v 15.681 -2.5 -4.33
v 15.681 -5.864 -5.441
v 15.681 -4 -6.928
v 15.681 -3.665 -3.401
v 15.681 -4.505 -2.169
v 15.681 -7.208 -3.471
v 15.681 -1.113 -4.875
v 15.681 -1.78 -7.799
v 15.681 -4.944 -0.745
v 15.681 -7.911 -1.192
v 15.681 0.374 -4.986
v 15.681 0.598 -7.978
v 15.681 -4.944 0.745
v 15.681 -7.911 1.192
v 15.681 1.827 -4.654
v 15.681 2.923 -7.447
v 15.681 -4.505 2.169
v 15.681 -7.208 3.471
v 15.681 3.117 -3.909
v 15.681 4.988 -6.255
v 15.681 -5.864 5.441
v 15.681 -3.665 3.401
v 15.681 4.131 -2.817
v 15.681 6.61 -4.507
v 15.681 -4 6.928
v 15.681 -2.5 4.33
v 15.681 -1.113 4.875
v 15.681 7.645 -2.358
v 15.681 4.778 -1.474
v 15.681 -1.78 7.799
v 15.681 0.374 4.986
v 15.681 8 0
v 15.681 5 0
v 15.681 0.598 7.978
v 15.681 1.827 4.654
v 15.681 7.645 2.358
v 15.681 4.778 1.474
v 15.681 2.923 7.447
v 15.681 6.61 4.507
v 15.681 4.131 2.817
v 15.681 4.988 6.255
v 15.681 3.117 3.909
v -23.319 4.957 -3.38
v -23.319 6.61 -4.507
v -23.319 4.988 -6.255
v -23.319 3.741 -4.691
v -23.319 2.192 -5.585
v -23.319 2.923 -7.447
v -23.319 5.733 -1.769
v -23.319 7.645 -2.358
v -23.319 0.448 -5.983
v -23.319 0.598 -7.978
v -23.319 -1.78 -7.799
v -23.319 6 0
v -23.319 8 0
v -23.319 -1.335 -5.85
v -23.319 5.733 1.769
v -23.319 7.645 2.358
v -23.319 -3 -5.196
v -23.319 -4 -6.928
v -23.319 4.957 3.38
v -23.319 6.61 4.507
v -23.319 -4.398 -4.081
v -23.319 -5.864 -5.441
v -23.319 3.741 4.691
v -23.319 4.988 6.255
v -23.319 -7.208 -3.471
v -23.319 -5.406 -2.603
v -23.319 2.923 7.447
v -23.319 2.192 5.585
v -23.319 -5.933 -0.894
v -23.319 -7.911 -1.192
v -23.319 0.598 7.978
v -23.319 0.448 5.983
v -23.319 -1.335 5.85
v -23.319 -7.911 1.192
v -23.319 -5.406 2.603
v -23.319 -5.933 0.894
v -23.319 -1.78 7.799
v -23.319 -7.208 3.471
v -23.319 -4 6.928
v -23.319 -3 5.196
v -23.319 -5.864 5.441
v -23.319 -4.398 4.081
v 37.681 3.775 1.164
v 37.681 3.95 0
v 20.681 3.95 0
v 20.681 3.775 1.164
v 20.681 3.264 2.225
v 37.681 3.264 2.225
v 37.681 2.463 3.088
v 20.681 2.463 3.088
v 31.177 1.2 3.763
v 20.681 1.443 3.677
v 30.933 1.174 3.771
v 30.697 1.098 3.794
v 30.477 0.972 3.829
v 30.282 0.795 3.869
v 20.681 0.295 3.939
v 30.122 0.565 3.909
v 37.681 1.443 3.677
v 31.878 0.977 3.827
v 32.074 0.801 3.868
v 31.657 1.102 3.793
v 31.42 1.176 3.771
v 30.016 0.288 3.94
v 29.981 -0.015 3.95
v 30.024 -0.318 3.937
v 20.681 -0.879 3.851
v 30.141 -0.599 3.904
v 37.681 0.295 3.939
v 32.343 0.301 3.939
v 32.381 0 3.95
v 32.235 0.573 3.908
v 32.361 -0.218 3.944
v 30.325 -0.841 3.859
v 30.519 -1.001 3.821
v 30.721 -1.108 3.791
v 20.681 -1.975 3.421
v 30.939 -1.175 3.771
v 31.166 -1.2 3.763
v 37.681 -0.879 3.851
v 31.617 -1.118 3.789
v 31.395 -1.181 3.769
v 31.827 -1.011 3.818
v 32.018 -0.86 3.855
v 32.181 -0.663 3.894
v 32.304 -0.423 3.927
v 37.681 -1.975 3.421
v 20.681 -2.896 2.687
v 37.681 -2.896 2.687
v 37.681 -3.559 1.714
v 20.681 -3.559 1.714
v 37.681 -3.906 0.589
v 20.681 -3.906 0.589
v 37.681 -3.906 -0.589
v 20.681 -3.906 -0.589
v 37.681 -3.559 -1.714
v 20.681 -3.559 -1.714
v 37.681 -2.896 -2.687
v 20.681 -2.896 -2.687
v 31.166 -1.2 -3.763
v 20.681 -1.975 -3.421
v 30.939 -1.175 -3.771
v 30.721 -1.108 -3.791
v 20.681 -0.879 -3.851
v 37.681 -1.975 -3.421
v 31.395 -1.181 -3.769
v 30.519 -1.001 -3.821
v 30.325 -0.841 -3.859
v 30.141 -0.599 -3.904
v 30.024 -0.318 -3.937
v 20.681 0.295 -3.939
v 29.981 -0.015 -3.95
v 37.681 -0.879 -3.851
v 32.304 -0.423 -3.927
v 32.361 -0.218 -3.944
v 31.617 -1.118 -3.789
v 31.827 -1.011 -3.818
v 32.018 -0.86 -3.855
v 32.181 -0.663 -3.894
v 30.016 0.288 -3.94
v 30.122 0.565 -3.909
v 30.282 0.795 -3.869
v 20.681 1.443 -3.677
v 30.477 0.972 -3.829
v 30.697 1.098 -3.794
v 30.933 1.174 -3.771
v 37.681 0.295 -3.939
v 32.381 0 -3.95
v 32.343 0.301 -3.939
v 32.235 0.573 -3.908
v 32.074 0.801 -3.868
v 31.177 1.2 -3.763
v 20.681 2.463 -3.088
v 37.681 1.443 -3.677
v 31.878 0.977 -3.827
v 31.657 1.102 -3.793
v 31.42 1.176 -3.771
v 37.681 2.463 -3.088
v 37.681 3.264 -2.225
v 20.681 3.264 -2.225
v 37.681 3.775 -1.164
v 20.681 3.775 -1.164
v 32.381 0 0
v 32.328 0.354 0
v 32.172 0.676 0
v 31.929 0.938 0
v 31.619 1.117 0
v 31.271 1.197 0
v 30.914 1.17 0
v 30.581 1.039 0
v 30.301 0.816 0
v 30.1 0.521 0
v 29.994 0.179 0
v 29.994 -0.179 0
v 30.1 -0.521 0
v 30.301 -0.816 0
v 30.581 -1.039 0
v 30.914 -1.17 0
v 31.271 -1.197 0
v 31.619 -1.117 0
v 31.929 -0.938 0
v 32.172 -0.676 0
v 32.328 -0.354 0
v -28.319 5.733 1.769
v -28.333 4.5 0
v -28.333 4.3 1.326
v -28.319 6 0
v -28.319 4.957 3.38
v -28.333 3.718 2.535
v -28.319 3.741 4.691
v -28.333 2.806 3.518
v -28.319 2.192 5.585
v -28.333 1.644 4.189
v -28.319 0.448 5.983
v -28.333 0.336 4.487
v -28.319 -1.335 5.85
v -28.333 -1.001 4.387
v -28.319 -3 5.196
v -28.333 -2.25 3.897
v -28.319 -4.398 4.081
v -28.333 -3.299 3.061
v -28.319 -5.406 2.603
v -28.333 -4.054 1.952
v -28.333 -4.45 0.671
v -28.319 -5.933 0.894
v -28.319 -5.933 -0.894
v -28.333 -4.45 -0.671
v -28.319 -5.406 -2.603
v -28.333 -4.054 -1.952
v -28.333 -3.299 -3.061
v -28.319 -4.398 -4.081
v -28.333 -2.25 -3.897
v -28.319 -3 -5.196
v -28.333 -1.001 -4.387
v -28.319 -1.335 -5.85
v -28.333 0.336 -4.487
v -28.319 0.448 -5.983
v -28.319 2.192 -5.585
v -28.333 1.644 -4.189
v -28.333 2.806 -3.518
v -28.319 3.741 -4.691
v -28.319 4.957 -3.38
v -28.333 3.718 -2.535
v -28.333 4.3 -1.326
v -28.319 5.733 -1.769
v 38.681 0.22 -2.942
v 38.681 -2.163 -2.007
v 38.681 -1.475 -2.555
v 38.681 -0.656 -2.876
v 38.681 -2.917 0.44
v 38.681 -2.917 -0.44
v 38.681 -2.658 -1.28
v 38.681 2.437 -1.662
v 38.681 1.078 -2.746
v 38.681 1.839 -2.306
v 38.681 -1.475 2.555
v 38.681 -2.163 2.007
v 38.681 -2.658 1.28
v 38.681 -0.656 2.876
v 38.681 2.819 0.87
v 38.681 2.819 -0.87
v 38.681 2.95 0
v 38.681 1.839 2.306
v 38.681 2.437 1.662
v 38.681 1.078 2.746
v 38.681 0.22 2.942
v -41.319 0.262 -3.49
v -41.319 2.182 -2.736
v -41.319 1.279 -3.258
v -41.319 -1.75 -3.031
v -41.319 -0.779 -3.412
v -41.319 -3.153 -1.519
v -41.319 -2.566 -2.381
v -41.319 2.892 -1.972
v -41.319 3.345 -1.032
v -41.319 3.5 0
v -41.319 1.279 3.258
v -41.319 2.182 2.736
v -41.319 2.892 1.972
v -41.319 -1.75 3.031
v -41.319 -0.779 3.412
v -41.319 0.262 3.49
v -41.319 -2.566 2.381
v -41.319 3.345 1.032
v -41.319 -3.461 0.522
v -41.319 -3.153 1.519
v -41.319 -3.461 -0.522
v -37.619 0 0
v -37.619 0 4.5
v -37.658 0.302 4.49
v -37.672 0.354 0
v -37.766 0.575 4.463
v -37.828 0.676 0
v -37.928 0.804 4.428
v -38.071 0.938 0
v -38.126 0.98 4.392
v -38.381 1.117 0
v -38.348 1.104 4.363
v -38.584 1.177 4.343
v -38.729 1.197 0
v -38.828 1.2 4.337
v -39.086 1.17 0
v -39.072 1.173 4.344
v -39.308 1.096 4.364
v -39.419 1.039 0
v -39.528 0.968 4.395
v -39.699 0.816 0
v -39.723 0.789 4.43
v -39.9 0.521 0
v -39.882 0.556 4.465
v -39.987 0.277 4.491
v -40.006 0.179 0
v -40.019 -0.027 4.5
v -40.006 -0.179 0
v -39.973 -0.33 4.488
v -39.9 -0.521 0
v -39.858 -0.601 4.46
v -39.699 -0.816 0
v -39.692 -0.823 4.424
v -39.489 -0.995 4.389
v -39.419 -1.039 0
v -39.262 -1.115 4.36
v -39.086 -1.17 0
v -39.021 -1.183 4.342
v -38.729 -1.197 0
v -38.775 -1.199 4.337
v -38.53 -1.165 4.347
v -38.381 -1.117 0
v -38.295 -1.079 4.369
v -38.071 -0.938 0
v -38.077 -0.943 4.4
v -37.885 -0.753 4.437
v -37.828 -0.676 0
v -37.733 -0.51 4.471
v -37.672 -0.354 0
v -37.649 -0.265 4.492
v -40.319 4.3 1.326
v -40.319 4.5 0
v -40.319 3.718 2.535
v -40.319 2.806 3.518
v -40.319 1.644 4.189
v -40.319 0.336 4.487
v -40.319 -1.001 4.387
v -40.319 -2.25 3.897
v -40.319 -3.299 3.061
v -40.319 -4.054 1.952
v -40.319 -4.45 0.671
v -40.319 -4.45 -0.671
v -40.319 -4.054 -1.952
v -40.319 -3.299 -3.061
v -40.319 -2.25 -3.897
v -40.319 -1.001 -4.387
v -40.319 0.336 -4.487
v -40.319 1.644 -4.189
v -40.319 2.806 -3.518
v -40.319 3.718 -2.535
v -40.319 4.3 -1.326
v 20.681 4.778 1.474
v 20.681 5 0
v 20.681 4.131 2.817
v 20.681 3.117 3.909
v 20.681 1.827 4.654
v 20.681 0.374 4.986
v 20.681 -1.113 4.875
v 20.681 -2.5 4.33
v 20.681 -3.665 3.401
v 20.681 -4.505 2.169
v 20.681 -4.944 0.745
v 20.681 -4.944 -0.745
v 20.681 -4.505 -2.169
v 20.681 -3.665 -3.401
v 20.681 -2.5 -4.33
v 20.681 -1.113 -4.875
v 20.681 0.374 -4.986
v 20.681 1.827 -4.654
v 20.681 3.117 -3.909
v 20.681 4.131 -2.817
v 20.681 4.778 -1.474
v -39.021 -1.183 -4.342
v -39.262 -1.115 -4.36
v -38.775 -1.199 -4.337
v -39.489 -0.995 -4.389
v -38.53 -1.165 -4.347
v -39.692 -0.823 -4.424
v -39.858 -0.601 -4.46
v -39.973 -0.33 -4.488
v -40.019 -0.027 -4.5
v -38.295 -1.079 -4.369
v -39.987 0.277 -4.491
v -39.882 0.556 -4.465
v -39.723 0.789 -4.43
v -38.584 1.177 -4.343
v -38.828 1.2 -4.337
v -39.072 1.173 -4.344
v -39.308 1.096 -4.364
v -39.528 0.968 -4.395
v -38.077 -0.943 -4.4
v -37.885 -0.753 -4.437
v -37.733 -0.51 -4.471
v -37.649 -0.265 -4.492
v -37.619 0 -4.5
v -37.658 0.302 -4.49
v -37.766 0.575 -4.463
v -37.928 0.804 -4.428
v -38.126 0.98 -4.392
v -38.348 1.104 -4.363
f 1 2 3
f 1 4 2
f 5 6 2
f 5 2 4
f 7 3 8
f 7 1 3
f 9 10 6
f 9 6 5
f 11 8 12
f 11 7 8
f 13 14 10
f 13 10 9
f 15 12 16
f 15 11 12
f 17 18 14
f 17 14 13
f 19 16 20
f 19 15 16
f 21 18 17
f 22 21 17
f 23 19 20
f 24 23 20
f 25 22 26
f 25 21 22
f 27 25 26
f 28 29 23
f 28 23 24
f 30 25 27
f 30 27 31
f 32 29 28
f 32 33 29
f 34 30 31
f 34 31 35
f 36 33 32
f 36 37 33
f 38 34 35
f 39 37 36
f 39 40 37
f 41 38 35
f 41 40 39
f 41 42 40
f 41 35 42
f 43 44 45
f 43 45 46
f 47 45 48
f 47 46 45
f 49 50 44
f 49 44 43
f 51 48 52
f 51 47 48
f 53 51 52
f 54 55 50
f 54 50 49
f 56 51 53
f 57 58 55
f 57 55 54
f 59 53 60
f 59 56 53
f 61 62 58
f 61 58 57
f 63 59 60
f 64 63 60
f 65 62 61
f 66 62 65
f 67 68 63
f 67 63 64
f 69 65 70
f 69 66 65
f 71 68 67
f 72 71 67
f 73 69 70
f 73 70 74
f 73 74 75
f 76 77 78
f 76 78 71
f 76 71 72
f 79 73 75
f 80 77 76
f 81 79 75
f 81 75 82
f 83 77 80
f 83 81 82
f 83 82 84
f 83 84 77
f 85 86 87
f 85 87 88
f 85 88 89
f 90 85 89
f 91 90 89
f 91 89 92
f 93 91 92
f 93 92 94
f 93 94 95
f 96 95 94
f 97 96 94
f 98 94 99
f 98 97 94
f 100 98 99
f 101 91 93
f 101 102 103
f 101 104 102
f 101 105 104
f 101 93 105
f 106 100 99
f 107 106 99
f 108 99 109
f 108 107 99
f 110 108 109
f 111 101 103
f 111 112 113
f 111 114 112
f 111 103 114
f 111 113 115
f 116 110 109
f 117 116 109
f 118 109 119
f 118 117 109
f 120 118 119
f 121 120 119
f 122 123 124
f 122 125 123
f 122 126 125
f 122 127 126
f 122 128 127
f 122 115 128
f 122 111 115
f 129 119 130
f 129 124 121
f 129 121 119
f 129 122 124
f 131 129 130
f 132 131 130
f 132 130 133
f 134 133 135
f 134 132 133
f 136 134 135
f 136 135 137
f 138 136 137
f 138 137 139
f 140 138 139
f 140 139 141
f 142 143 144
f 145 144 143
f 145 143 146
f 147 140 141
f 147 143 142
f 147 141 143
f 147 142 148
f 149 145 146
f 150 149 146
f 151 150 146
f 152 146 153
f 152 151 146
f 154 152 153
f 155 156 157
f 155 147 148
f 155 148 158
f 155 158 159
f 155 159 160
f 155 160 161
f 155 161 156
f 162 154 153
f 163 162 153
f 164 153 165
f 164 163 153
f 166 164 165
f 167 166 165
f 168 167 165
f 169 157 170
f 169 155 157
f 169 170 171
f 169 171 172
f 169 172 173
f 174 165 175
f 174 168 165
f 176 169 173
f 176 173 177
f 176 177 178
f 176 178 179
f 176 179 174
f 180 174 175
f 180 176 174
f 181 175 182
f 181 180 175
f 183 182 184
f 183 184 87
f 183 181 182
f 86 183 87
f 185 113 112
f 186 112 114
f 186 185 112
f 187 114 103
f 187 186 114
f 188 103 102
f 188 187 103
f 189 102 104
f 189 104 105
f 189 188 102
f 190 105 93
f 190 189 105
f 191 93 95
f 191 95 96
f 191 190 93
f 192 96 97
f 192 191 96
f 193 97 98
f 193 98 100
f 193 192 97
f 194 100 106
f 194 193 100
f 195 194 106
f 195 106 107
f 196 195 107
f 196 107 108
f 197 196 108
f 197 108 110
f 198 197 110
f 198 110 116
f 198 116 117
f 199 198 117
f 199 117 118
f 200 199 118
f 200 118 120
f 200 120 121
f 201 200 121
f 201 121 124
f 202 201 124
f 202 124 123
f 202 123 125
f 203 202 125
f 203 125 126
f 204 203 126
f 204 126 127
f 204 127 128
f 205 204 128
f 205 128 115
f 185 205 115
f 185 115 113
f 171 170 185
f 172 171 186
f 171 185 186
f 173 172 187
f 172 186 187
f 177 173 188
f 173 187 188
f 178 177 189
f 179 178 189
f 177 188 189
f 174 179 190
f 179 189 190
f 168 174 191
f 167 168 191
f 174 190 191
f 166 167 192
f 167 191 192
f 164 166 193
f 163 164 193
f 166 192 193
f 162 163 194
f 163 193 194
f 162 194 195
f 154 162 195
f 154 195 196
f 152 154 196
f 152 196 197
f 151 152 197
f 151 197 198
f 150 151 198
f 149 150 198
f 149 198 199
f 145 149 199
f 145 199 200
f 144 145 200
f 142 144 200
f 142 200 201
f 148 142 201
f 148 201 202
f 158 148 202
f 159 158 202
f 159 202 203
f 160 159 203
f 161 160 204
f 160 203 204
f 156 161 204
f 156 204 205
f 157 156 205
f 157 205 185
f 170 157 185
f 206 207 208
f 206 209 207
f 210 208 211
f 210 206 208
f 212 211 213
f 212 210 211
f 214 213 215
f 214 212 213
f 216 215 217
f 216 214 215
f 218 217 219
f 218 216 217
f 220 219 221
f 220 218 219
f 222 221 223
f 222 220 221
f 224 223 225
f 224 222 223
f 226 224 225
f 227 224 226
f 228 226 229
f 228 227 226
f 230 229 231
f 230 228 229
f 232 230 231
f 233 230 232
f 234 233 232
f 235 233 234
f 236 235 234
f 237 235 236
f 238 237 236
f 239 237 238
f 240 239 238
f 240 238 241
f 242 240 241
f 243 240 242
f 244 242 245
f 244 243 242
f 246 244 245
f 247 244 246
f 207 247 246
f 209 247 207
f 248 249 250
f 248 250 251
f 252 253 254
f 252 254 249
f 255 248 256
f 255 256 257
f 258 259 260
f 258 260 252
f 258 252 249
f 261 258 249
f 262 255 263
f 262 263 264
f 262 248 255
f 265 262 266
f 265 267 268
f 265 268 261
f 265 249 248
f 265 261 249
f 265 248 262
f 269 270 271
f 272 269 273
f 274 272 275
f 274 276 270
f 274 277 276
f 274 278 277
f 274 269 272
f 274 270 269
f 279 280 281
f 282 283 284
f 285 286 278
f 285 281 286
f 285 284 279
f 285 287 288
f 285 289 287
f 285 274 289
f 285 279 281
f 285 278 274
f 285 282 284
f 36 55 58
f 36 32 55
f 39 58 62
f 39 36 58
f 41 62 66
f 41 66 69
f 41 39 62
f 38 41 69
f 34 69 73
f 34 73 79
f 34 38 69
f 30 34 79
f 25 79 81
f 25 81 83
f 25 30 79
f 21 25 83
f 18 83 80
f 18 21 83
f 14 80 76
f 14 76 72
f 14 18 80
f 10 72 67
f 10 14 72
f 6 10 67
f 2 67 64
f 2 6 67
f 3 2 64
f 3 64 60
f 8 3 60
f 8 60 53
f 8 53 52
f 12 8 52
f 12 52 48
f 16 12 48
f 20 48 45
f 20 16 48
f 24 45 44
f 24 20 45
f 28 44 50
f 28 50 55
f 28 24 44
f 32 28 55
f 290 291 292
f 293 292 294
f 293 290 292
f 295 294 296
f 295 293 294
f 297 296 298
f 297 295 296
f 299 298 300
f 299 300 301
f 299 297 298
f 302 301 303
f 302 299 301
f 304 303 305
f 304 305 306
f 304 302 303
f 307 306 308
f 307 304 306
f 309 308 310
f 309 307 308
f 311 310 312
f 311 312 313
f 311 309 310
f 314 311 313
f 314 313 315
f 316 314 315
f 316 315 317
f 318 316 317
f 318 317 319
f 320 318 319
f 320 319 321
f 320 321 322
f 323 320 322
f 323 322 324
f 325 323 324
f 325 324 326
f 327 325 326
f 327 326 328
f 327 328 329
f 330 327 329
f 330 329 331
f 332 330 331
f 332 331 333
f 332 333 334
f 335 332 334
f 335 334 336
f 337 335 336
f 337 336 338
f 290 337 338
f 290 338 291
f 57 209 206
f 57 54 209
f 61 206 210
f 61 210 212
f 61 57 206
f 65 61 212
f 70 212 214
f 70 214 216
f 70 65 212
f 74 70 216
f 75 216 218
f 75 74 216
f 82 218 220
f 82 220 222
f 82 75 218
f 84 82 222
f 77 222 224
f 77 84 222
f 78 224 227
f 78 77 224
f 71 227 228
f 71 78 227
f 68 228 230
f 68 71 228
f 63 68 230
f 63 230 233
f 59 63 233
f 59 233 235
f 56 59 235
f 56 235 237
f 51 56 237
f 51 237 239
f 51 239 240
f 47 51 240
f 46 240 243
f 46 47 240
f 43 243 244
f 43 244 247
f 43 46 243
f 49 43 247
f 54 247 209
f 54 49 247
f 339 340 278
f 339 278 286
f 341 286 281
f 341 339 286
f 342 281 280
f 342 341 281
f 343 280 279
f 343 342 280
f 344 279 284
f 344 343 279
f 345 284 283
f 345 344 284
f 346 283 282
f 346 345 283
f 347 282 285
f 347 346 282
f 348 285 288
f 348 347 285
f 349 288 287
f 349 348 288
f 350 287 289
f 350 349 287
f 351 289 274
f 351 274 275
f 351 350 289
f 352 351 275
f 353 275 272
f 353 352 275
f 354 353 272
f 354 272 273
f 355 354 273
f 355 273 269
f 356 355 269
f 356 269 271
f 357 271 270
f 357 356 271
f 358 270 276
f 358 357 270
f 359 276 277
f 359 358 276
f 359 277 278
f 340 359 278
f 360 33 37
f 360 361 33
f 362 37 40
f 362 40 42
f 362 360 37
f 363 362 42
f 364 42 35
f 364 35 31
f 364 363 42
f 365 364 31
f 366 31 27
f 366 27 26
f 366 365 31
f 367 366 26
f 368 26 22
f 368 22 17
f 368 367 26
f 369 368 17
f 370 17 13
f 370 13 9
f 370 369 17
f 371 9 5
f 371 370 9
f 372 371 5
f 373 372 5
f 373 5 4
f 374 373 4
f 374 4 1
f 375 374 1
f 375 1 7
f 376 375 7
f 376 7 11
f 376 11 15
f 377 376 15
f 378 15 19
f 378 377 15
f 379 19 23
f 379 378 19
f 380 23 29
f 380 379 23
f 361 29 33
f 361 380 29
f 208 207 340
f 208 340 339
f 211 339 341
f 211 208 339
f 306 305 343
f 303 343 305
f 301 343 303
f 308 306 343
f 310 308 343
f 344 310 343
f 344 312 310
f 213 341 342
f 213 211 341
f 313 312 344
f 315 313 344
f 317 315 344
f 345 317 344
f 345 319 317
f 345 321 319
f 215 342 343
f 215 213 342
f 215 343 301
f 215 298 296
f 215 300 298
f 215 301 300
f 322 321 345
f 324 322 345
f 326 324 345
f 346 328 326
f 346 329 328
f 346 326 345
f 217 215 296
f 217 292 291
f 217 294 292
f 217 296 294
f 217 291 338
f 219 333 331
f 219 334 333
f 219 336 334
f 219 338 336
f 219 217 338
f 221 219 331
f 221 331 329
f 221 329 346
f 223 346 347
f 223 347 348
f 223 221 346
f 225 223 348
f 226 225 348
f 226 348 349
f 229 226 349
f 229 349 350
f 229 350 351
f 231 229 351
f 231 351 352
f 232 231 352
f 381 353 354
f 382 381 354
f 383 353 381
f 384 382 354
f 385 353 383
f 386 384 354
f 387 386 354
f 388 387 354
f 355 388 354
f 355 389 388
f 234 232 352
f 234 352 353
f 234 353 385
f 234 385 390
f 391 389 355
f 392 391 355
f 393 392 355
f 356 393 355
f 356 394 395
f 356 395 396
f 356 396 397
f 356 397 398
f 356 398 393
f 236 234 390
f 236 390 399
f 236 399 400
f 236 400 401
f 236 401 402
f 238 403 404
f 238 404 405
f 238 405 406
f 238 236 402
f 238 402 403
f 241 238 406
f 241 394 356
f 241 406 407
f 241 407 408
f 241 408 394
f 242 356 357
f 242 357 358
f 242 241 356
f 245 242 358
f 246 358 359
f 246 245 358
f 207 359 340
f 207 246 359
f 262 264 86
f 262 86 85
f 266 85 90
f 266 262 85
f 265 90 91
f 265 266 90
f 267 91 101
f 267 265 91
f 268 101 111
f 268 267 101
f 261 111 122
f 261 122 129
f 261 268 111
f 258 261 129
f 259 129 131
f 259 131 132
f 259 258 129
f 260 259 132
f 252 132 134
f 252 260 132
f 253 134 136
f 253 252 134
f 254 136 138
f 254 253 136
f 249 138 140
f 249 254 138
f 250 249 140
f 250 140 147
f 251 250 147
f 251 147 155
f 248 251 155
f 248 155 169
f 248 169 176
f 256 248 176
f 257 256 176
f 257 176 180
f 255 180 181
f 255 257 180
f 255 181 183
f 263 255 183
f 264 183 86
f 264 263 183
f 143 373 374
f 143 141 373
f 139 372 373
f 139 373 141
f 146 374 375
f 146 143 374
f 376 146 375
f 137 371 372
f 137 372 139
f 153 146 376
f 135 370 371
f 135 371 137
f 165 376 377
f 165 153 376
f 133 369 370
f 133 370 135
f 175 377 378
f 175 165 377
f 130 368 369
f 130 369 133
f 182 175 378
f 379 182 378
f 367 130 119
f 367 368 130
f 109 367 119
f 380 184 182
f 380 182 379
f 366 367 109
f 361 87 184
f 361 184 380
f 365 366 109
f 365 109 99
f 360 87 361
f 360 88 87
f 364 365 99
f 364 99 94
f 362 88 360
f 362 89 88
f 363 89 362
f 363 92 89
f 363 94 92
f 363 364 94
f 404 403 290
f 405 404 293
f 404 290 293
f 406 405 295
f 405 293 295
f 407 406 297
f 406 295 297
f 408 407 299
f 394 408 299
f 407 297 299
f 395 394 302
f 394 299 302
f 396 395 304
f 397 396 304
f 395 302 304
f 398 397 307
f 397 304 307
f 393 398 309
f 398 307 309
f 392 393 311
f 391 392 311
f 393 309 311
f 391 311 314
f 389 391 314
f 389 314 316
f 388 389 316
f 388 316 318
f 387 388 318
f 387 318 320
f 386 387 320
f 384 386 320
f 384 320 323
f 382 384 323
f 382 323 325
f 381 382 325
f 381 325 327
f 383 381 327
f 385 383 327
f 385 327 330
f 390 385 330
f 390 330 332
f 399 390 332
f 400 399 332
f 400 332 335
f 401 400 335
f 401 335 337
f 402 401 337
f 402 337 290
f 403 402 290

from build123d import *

# Parameters (mm, degrees)
CHAMFER1_SIZE           = 1
SKETCH2_R               = 1.2
CUT_EXTRUDE1_DEPTH      = 9
CUT_EXTRUDE1_DEPTH_BACK = 9


with BuildPart() as part:
    # Sketch1 → Revolve1 (revolve)
    with BuildSketch(Plane.XY):
        Polygon((-41.319098712, 0), (-41.319098712, 4.5), (-28.333497823, 4.5), (-28.319098712, 5.999930887), (-23.319098712, 5.999930887), (-23.319098712, 8), (15.680901288, 8), (15.680901288, 5), (20.680901288, 5), (20.680901288, 3.95), (38.680901288, 3.95), (38.680901288, 0), align=None)
    revolve(axis=Axis((-41.319098712, 0, 0), (1, 0, 0)))

    # Chamfer1
    chamfer1_edges = [part.edges().sort_by_distance(p)[0] for p in [
        (-41.319098712, -4.5, 0),
        (38.680901288, -3.95, 0),
    ]]
    chamfer(chamfer1_edges, length=CHAMFER1_SIZE)

    # Sketch2 → Cut-Extrude1 (cut, two sides)
    with BuildSketch(Plane.XY) as cut_extrude1_sk:
        with Locations((-38.819098712, 0)):
            Circle(SKETCH2_R)
        with Locations((31.180901288, 0)):
            Circle(SKETCH2_R)
    extrude(amount=CUT_EXTRUDE1_DEPTH, mode=Mode.SUBTRACT)
    extrude(cut_extrude1_sk.sketch, amount=-CUT_EXTRUDE1_DEPTH_BACK, mode=Mode.SUBTRACT)


solid = part.part
